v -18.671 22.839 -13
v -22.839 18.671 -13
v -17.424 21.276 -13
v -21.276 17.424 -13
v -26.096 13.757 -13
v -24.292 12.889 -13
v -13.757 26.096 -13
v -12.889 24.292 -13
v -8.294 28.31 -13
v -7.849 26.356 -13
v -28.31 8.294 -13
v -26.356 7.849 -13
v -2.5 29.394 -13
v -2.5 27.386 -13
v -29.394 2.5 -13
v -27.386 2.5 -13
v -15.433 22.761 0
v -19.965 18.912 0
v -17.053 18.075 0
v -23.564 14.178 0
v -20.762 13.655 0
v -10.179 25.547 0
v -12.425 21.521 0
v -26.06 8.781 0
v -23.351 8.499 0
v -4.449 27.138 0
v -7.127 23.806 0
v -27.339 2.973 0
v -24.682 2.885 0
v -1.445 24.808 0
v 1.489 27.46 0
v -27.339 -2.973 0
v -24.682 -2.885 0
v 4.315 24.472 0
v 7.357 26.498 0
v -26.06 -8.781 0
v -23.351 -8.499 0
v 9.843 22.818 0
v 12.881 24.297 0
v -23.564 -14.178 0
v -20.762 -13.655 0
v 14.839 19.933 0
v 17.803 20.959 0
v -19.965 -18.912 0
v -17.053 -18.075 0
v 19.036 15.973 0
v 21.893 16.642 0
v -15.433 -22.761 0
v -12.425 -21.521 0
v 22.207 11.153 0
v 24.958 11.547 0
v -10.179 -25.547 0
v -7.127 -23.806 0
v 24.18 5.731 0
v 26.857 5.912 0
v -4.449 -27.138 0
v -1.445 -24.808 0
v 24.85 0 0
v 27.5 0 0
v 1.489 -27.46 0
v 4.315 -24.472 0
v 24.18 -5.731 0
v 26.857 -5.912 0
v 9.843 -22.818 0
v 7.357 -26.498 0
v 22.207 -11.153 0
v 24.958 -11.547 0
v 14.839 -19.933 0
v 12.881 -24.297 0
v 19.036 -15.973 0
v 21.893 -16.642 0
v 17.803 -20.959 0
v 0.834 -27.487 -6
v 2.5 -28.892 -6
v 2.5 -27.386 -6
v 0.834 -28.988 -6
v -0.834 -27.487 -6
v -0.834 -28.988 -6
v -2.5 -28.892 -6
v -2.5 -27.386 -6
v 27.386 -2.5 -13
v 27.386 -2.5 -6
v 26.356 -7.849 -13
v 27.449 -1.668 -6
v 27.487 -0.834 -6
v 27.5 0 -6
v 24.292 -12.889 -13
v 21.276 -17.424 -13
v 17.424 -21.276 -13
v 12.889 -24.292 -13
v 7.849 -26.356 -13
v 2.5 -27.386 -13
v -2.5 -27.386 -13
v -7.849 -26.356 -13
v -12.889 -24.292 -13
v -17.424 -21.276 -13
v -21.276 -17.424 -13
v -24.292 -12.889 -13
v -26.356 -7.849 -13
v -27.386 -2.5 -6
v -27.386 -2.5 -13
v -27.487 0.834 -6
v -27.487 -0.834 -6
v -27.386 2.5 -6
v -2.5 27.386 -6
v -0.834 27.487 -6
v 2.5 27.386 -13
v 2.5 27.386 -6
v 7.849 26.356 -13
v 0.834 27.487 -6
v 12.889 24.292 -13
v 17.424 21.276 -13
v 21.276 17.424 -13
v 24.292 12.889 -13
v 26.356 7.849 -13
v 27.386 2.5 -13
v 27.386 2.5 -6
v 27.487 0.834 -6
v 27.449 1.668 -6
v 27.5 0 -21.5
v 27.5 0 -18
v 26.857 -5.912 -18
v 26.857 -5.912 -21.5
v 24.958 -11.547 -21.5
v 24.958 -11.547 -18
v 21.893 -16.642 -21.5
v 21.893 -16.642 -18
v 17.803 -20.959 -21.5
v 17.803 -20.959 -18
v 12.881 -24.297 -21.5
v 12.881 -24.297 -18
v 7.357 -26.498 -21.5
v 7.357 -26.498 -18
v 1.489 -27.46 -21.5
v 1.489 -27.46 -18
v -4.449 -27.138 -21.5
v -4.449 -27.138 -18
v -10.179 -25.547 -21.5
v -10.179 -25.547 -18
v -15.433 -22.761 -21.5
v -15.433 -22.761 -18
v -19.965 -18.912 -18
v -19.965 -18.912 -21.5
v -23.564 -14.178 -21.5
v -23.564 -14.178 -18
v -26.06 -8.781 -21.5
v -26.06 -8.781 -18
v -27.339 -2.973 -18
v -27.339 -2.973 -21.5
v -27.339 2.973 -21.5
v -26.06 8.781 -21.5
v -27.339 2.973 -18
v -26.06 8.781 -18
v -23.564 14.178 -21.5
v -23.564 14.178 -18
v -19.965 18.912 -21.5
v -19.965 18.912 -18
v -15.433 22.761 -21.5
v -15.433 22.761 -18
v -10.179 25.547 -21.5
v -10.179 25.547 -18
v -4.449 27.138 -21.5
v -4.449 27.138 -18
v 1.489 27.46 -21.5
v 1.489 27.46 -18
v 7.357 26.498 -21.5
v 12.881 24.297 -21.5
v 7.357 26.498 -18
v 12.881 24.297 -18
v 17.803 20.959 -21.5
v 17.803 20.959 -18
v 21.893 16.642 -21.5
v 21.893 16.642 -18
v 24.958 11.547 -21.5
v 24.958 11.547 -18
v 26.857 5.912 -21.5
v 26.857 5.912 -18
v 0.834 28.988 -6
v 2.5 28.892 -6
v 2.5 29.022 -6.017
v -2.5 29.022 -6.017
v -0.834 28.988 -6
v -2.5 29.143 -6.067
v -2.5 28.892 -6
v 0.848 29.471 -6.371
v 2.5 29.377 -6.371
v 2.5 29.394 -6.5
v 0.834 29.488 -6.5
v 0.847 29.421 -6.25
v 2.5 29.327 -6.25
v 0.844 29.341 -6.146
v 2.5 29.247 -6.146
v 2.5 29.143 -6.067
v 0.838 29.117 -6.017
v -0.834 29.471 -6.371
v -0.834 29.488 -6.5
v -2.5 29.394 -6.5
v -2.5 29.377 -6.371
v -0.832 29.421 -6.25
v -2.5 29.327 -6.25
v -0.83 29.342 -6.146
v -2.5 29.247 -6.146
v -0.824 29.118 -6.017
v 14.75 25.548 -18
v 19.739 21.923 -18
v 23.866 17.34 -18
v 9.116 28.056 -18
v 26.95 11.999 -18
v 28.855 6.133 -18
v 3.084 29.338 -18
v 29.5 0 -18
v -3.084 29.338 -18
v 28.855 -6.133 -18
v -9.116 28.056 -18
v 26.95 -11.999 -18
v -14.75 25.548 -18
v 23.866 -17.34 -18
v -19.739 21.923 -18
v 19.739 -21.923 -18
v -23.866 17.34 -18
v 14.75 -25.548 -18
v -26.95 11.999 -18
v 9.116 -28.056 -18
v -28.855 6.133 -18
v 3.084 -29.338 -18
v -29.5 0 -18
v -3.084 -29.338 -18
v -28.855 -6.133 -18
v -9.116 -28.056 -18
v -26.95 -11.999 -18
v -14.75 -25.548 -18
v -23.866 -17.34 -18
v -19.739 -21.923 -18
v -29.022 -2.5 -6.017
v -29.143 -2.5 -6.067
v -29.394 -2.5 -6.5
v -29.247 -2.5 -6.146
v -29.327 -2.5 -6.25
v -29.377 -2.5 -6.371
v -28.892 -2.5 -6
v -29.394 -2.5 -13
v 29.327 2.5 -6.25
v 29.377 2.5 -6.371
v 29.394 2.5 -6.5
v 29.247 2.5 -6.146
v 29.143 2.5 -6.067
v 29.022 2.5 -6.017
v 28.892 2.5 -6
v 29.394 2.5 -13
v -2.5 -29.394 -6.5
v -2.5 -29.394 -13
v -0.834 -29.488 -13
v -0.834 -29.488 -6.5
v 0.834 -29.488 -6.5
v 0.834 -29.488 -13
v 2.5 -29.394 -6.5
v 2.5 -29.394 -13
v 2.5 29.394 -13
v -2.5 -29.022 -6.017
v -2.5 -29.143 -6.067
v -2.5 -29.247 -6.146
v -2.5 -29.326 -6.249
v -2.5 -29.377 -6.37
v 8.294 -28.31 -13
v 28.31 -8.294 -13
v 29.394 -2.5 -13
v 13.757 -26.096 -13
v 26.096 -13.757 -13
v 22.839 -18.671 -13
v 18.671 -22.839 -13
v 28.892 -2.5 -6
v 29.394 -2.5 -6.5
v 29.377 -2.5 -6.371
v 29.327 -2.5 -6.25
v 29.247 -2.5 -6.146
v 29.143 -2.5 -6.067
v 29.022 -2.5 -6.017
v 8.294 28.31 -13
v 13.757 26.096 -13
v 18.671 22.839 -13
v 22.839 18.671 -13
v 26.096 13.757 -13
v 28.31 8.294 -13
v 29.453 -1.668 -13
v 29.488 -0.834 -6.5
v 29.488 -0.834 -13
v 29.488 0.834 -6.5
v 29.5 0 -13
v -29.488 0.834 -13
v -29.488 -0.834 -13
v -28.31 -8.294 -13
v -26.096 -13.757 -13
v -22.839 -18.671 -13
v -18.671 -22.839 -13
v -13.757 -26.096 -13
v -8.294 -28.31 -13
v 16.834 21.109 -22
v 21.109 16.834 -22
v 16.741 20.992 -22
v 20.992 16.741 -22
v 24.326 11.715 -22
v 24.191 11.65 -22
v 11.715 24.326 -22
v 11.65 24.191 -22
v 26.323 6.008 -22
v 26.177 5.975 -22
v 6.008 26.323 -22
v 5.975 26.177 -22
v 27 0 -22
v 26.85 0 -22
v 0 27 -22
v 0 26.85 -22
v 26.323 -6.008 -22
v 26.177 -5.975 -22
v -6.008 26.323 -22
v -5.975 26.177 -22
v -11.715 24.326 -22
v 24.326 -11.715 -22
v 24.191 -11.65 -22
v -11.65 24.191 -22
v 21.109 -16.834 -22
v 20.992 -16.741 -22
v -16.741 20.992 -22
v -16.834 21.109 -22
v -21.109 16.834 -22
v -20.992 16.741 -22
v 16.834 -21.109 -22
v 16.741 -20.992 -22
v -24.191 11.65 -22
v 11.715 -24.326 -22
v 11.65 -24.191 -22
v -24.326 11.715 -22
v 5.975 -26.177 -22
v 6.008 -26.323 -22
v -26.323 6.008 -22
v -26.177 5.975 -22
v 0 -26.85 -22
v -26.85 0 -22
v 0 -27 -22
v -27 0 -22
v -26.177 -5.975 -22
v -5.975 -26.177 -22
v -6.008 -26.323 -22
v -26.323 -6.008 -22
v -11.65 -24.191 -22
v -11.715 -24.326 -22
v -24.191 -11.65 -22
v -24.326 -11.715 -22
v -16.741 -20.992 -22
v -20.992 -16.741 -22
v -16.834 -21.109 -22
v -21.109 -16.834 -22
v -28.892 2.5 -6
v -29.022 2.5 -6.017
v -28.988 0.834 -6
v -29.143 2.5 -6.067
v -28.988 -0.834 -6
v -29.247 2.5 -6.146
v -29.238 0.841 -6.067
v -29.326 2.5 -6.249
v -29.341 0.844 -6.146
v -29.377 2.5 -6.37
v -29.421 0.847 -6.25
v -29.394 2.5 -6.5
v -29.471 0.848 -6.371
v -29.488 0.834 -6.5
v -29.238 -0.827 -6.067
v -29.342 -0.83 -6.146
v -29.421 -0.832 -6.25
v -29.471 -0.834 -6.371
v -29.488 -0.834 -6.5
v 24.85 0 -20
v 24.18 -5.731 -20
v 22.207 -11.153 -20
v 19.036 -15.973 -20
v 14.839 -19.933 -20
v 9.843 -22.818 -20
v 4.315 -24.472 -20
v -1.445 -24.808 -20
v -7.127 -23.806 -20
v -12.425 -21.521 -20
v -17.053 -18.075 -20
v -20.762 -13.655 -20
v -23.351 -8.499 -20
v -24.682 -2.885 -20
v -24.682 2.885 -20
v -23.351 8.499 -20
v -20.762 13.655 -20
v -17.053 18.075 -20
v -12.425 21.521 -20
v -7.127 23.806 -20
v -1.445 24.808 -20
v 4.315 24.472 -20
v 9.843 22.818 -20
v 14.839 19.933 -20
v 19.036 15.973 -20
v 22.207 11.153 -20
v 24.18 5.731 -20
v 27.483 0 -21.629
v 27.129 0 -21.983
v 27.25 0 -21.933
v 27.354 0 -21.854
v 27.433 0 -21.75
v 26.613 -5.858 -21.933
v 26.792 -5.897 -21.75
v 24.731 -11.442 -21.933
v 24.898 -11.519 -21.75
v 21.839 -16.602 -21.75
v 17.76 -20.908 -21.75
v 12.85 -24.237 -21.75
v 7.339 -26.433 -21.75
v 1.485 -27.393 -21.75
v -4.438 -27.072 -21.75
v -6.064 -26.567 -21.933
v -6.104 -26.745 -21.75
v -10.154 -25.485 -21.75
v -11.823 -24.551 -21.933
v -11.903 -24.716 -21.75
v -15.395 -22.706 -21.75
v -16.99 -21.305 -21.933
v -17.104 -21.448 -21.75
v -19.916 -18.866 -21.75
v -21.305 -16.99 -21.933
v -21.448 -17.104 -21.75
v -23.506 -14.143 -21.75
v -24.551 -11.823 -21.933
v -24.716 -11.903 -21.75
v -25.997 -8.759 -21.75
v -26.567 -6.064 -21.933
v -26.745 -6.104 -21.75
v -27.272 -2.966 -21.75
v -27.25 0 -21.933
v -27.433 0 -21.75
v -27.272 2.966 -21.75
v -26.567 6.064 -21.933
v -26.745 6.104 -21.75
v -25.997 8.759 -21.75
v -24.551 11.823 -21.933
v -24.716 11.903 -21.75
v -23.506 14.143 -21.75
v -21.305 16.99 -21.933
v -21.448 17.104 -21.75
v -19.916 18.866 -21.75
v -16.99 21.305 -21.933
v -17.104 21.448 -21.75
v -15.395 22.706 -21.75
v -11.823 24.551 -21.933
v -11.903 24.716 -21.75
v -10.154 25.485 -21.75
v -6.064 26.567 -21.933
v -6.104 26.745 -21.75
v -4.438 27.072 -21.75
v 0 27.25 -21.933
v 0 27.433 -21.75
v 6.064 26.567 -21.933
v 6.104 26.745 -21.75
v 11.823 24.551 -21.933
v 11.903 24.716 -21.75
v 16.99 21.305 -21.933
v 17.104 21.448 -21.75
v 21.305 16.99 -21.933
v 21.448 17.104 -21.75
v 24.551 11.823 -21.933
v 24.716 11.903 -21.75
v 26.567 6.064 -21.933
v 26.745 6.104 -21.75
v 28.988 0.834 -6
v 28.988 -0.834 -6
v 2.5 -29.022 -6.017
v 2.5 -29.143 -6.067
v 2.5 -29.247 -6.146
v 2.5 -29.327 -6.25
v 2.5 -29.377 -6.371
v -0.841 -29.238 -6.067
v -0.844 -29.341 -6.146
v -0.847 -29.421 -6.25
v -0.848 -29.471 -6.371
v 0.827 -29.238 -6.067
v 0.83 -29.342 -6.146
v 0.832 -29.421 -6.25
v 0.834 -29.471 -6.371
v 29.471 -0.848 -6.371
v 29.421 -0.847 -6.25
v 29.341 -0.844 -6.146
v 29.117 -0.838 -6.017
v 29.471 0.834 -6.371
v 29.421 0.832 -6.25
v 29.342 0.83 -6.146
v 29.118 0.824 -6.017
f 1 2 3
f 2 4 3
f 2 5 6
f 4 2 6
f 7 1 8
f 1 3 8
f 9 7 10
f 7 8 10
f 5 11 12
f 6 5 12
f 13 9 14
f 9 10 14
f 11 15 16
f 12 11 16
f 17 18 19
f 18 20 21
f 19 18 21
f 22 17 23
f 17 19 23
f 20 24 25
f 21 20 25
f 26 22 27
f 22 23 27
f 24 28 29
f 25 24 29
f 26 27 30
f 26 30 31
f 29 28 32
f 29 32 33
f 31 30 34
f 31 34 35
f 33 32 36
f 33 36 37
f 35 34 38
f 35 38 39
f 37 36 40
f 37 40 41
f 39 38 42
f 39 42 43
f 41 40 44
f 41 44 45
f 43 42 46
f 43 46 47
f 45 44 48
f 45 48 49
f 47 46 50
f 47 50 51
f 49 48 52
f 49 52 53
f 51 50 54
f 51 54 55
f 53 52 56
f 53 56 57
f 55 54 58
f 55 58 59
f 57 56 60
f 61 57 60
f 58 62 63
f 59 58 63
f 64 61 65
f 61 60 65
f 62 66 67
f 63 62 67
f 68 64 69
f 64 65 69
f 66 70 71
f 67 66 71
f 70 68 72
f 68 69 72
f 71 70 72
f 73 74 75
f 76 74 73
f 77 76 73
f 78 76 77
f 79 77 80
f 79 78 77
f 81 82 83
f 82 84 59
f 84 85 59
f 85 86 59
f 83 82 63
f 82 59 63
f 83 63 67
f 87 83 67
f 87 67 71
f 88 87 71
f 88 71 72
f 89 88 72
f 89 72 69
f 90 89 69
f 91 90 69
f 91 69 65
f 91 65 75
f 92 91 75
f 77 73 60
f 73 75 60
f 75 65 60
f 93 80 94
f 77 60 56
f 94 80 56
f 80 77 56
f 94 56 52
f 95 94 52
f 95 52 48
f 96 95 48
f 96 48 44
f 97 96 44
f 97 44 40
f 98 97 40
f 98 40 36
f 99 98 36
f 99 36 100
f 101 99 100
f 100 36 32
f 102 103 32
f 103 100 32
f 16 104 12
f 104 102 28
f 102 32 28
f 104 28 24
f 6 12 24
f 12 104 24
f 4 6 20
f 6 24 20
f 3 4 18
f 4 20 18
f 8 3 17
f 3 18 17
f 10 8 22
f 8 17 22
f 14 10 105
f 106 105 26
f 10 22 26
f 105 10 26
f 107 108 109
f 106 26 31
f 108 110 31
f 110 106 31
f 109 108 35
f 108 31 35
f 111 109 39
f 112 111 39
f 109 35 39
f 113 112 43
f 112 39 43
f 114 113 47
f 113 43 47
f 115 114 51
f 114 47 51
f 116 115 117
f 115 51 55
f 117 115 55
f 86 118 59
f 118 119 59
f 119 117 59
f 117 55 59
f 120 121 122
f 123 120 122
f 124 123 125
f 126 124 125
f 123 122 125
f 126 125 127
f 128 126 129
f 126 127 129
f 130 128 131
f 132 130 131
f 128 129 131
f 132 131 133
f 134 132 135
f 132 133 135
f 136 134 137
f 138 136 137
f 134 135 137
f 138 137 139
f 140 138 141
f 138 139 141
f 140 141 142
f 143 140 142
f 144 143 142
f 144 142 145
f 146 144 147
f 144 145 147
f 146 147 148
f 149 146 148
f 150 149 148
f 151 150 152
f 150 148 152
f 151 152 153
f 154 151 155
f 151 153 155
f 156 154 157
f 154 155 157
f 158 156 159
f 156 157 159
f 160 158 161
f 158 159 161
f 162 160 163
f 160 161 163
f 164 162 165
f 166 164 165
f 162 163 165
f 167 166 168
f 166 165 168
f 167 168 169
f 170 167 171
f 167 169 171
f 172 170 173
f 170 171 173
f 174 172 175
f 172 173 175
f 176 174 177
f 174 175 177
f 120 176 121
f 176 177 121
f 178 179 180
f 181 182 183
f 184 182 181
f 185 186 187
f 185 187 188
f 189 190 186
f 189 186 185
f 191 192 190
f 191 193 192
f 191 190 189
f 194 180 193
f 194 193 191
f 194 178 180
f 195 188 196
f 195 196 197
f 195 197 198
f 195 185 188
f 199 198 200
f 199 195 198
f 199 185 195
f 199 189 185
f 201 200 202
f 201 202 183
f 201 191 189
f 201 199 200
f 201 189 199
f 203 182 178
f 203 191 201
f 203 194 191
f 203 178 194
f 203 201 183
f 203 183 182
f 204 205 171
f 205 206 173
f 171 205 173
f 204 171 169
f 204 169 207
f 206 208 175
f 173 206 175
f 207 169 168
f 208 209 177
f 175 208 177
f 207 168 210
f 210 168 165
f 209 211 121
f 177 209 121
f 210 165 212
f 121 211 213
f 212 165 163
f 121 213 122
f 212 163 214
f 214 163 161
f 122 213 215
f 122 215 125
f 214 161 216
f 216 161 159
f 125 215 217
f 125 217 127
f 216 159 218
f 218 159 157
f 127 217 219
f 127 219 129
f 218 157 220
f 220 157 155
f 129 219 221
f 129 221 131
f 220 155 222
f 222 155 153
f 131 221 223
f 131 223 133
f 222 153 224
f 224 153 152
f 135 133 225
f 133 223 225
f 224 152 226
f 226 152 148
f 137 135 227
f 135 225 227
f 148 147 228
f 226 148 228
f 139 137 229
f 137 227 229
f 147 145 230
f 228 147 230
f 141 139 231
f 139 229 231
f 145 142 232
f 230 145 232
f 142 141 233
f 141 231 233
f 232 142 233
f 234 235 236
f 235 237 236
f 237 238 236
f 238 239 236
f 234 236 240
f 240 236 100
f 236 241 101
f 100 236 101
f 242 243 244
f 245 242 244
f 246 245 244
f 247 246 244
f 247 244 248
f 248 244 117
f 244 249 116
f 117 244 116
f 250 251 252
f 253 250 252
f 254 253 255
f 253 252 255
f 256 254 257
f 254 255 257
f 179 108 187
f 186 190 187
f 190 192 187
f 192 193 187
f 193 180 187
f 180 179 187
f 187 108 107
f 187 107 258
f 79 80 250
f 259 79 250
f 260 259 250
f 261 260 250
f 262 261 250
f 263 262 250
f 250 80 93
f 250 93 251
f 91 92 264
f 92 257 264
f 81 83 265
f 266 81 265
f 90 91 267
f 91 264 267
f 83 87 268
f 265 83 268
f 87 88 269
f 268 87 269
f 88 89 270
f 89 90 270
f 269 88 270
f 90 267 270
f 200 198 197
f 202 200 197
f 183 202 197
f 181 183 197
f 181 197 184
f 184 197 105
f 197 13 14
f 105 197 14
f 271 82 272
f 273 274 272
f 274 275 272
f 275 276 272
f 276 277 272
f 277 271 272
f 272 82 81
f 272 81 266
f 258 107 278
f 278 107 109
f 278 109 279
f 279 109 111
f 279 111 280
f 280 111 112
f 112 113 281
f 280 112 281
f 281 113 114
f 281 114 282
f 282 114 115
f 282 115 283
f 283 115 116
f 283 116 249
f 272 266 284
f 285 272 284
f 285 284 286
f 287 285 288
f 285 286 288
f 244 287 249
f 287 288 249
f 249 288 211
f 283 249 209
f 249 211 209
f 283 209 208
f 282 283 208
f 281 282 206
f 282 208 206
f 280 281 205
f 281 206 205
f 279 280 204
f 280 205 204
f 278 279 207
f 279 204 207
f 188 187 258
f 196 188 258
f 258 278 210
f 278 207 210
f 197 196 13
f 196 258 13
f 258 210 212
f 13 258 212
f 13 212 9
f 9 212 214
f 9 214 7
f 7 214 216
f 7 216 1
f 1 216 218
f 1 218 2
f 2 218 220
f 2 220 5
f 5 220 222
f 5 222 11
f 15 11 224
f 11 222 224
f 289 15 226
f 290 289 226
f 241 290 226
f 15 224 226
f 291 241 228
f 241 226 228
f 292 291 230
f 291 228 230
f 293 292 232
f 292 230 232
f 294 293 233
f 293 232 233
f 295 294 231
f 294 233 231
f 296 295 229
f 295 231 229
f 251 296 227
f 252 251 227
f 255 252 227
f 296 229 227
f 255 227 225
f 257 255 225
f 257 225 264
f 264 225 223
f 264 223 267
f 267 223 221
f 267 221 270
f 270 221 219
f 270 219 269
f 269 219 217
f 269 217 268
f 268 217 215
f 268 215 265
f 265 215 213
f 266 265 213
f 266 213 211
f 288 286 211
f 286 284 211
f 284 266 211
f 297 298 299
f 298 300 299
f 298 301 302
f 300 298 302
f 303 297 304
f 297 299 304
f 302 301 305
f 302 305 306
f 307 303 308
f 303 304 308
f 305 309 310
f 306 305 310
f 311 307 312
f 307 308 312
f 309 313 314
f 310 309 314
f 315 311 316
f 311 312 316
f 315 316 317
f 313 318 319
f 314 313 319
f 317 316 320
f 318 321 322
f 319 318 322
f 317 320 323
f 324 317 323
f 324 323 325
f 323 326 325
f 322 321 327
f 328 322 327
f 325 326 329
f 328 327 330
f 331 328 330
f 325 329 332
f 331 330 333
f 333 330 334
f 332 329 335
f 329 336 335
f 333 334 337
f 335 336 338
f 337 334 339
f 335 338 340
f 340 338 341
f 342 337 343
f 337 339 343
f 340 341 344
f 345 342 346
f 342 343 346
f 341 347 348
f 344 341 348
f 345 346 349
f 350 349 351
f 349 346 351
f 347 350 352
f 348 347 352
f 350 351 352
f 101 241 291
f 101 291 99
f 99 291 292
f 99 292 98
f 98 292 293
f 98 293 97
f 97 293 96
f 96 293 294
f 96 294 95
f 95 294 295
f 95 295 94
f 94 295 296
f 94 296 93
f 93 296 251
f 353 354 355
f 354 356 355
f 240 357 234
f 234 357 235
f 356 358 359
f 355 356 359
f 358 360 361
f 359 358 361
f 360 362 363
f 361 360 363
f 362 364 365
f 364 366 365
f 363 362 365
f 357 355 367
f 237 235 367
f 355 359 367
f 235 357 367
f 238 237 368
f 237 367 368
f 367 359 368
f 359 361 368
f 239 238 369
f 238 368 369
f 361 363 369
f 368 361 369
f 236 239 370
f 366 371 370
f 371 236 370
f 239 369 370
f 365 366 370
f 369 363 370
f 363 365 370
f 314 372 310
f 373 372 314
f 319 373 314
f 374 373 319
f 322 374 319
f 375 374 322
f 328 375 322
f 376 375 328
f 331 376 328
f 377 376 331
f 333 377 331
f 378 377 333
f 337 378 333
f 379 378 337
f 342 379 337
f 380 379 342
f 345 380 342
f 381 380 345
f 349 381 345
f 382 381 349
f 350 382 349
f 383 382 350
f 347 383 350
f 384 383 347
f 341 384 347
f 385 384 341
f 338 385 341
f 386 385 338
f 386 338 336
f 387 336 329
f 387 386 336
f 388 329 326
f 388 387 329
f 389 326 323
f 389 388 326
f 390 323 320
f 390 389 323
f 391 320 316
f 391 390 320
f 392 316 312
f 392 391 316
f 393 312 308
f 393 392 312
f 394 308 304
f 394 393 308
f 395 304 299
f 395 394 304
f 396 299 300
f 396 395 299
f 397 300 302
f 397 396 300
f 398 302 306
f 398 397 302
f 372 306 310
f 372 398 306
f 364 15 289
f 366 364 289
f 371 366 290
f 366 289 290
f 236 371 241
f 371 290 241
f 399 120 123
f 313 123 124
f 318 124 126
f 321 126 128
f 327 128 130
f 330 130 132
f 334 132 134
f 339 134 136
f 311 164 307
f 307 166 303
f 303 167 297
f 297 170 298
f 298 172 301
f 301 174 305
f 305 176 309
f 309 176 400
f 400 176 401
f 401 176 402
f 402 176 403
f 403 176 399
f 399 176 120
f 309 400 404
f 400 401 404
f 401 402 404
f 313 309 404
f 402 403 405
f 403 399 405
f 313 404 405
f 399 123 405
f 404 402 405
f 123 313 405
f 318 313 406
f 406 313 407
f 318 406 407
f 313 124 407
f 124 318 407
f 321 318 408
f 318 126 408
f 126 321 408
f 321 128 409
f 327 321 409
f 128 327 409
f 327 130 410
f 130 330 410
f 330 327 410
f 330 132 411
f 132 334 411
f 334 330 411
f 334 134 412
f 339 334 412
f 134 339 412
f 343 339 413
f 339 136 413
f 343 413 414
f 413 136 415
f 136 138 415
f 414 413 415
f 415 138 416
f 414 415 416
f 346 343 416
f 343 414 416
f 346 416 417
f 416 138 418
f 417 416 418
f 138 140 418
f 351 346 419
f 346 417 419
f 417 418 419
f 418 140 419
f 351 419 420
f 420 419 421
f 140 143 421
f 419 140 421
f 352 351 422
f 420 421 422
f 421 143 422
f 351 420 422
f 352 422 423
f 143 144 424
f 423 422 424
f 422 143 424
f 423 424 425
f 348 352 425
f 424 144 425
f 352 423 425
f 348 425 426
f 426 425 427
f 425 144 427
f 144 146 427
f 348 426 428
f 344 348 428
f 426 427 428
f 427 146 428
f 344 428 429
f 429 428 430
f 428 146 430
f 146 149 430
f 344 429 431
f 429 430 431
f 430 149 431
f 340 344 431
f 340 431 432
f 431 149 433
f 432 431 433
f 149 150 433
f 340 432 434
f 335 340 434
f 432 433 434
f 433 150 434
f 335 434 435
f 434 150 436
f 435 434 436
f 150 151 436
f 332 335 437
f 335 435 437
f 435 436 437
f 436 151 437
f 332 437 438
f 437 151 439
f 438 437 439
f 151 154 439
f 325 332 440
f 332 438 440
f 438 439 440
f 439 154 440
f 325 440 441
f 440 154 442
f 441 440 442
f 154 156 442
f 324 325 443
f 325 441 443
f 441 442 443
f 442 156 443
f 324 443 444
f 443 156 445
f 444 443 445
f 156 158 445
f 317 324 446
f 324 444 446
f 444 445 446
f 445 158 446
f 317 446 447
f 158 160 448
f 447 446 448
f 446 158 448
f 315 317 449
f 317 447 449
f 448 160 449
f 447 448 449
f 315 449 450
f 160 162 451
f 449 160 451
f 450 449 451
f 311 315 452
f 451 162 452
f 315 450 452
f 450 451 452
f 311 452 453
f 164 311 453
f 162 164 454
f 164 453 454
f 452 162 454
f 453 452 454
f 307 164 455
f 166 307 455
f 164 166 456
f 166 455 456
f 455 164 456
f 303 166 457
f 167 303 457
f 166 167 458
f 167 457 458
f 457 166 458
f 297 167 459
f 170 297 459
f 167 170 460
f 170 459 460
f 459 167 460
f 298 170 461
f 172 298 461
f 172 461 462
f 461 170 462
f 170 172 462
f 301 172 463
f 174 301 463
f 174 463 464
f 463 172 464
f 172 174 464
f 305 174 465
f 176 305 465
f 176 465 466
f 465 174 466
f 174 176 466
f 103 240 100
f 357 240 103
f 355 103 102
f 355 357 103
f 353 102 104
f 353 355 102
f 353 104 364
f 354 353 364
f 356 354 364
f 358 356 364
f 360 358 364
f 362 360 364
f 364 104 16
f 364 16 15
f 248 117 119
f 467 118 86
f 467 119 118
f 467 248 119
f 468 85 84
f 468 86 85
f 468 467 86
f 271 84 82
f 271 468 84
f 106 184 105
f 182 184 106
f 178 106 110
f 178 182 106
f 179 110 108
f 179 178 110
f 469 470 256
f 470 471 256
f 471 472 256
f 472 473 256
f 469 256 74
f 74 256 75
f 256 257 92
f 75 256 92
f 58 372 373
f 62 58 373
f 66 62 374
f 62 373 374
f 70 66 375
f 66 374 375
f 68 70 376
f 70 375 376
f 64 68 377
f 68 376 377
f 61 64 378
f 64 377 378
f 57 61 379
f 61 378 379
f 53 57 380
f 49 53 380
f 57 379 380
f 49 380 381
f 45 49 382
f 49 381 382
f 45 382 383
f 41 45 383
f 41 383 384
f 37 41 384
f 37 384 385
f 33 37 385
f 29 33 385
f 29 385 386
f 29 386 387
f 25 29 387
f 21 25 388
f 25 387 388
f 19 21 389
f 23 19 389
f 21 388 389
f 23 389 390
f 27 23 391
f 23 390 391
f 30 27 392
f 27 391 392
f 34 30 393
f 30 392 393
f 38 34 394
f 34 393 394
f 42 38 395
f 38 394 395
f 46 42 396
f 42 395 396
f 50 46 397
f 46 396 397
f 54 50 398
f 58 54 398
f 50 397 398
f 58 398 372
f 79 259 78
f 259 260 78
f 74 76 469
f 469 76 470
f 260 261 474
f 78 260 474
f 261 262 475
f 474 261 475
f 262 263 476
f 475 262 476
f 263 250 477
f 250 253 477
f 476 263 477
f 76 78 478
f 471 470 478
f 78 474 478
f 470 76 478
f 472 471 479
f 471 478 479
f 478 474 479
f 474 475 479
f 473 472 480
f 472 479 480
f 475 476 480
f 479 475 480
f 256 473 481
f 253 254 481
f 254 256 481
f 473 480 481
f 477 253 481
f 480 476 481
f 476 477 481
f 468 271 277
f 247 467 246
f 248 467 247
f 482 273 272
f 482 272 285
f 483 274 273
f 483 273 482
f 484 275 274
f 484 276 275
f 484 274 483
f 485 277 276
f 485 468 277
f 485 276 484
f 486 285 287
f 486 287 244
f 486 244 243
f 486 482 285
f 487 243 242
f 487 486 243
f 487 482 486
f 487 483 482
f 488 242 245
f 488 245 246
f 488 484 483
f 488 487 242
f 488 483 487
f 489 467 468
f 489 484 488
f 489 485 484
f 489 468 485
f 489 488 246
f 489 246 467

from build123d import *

# Parameters (mm, degrees)
F2_R            = 0.5
F3_SIZE         = 2
F5_DEPTH        = 7
F5_COPIES_COUNT = 4
F6_R            = 0.5


# Not quite as in the source:
# - after a boolean that leaves OpenCascade's solid faulty, fix() repairs it
# - a pattern or mirror of a feature is missing from the dataset's text; its kind, count and spacing are read off the source's solid


with BuildPart() as f1:
    # F0 (on Front) → F1 (revolve)
    with BuildSketch(Plane.XZ):
        Polygon((27.5, 0), (24.85, 0), (24.85, -22), (27.5, -22), (27.5, -18), (29.5, -18), (29.5, -13), (27.5, -13), align=None)
    revolve(axis=Axis((0, 0, -6.1865765601), (0, 0, -1)))

    # F2
    f2_edges = [f1.edges().sort_by_distance(p)[0] for p in [
        (-27.5, 0, -22),
    ]]
    fillet(f2_edges, radius=F2_R)

    # F3
    f3_edges = [f1.edges().sort_by_distance(p)[0] for p in [
        (-24.85, 0, -22),
    ]]
    chamfer(f3_edges, length=F3_SIZE)

    # F4 (on face) → F5 (join)
    with BuildSketch(Plane.XY.offset(-13)):
        with BuildLine():
            Line((-2.5, 29.3938769134), (-2.5, 27.3861278753))
            Line((-2.5, 27.3861278753), (2.5, 27.3861278753))
            Line((2.5, 27.3861278753), (2.5, 29.3938769134))
            ThreePointArc((2.5, 29.3938769134), (0, 29.5), (-2.5, 29.3938769134))
        make_face()
    f5 = extrude(amount=F5_DEPTH)

    # F5_copies: F5 ×4 about axis
    f5_copies_axis = Axis((0, 0, 0), (0, 0, 1))
    for i in range(1, F5_COPIES_COUNT):
        add(f5.rotate(f5_copies_axis, i * 360 / F5_COPIES_COUNT))

    add(f1.part.fix(), mode=Mode.REPLACE)

    # F6
    f6_edges = [f1.edges().sort_by_distance(p)[0] for p in [
        (0, 29.5, -6),
        (-29.5, 0, -6),
        (0, -29.5, -6),
        (29.5, 0, -6),
    ]]
    fillet(f6_edges, radius=F6_R)


solid = f1.part
